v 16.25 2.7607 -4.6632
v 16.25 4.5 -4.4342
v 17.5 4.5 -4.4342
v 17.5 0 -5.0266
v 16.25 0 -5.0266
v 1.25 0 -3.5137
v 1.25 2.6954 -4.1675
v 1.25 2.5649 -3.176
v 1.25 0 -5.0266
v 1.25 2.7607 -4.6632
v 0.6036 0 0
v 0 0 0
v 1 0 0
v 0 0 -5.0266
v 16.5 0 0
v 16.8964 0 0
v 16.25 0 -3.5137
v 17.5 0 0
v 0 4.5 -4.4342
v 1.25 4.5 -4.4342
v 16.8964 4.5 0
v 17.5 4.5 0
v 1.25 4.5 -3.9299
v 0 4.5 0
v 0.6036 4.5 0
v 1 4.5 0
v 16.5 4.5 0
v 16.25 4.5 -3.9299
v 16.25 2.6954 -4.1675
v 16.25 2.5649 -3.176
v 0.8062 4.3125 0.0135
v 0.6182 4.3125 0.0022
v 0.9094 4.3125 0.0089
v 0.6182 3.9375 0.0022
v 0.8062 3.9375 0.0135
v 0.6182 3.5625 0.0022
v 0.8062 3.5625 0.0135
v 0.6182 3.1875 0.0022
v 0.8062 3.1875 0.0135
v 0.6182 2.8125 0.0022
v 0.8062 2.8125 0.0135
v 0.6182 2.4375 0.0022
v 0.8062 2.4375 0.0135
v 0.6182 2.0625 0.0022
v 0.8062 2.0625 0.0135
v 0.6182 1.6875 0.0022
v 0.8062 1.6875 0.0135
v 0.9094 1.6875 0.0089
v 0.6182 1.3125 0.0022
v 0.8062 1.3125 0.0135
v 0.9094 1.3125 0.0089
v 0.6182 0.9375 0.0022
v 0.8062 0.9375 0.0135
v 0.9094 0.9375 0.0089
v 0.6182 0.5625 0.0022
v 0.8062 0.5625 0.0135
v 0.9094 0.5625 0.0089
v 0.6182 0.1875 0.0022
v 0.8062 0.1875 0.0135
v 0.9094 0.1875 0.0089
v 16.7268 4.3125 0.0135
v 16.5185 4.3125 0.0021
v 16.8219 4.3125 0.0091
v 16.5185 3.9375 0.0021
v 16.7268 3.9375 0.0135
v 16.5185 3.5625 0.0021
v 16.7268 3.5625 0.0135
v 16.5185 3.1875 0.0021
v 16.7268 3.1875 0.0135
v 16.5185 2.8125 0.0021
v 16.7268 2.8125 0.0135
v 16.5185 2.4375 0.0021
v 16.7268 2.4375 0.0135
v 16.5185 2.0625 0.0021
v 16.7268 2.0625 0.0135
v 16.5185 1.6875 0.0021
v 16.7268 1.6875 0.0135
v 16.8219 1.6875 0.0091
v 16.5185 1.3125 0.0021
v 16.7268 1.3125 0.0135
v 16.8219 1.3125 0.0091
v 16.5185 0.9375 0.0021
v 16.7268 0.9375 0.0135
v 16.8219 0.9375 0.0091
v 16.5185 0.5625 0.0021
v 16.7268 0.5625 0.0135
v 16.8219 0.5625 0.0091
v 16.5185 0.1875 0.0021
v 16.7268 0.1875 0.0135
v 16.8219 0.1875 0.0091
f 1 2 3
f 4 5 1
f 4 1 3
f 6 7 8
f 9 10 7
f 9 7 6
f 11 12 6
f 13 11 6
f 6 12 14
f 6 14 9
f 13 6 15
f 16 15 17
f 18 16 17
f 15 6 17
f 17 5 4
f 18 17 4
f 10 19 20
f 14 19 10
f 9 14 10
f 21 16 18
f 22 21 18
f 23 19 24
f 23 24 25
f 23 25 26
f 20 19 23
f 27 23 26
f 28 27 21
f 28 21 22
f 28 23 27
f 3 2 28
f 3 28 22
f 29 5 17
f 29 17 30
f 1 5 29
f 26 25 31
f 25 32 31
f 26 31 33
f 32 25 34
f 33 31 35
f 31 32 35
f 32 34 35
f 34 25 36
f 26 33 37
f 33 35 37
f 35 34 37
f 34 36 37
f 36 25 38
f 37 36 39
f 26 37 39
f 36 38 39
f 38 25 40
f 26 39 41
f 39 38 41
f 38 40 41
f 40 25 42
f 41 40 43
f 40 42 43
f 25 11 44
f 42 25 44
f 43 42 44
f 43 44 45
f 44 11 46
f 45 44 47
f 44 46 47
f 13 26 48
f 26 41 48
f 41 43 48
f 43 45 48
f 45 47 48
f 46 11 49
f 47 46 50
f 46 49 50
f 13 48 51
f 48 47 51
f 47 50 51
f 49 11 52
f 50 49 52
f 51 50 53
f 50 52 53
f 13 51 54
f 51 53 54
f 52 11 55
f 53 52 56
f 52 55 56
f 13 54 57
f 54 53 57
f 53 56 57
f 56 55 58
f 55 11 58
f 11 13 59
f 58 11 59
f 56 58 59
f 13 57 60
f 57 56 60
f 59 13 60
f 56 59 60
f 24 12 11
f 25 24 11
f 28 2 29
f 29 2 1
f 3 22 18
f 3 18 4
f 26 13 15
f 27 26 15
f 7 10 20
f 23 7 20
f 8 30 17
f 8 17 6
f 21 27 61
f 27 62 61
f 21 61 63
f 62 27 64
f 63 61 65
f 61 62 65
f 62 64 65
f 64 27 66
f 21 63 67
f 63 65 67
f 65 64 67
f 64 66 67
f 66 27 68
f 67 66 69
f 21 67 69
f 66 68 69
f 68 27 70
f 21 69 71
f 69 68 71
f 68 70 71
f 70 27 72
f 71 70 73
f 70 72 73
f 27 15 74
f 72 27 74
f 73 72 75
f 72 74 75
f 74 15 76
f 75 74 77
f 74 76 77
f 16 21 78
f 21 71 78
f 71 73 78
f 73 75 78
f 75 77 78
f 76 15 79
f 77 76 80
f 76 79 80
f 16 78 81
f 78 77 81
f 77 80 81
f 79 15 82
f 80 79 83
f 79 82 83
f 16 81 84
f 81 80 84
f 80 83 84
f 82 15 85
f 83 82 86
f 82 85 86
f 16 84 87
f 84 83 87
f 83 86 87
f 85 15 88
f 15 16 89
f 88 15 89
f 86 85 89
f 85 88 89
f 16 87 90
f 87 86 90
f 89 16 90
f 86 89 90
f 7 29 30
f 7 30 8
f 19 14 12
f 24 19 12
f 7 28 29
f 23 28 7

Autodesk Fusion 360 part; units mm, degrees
sketch "Sketch1" plane through (0, 0, 0) normal (0, 1, 0) x (1, 0, 0)
  line L0 (0, 0) -> (30, 0)
  line L1 (30, 0) -> (30, -11.5)
  line L2 (30, -11.5) -> (0, -11.5)
  line L3 (0, -11.5) -> (0, 0)
  dimension "d1" = 30
  dimension "d2" = 11.5
extrude "Extrude1" add sketch "Sketch1" along normal blind 4.5

Autodesk Fusion 360 part; units mm, degrees
sketch "Sketch1" plane through (0, 0, 0) normal (0, 1, 0) x (1, 0, 0)
  line L0 (0, 0) -> (17.5, 0)
  line L1 (17.5, 0) -> (17.5, 3)
  line L2 (17.5, 3) -> (0, 3)
  line L3 (0, 3) -> (0, 0)
  line L4 (0, 0) -> (1, 0)
  line L5 (17.5, 0) -> (16.5, 0)
  line L6 (0, 3) -> (8.75, 3)
  line L7 (0, 0) -> (0, 1)
  line L8 (17.5, 0) -> (17.5, 1)
  line L9 (8.75, 3) -> (8.75, 2)
  spline S0 degree 5 poles (0, 1) (-0.0052, 0.8576) (0.0051, 0.5979) (0.0824, 0.284) (0.3098, 0.0171) (0.8015, -0.0688) (1.4966, 0.0725) (2.3822, 0.3921) (3.4374, 0.8195) (4.6351, 1.2741) (5.9435, 1.6748) (7.3276, 1.9503) (8.75, 2.049) (10.1724, 1.9503) (11.5565, 1.6748) (12.8649, 1.2741) (14.0626, 0.8195) (15.1178, 0.3921) (16.0034, 0.0725) (16.6985, -0.0688) (17.1902, 0.0171) (17.4176, 0.284) (17.4949, 0.5979) (17.5052, 0.8576) (17.5, 1) knots 0 0 0 0 0 0 0.05 0.1 0.15 0.2 0.25 0.3 0.35 0.4 0.45 0.5 0.55 0.6 0.65 0.7 0.75 0.8 0.85 0.9 0.95 1 1 1 1 1 1
  line L10 (17.5, 3) -> (0, 3)
  line L11 (0, 3) -> (0, 4.5)
  line L12 (0, 4.5) -> (17.5, 4.5)
  line L13 (17.5, 4.5) -> (17.5, 3)
  dimension "d1" = 17.5
  dimension "d2" = 3
  dimension "d3" = 1
  dimension "d4" = 1
  dimension "d5" = 8.75
  dimension "d6" = 1
  dimension "d7" = 1
  dimension "d8" = 1
  dimension "d23" = 17.5
  dimension "d24" = 1.5
extrude "Extrude1" add sketch "Sketch1" along normal blind 4 contours L0 L3 L4 L7 S0 | L0 L2 L3 L4 L6 L9 S0 L10 | L0 L1 L5 L8 S0 | L0 L1 L2 L5 L9 S0 L10 | L2 L6 L10 L11 L12 L13
draft "Draft1" angle 7.5 neutral plane through (0, 4, 0) pull (0, 1, 0) 1 faces at (5.8333, 2.6667, -4.5)
sketch "Sketch3" plane through (0, 0.6505, -4.941) normal (0, 0.1305, -0.9914) x (-1, 0, 0)
  line L0 (-17.5, -0.6561) -> (0, -0.6561)
  line L1 (0, -0.6561) -> (0, 3.3784)
  line L2 (0, 3.3784) -> (-17.5, 3.3784)
  line L3 (-17.5, 3.3784) -> (-17.5, -0.6561)
  line L4 (-17.5, 3.3784) -> (-16.25, 3.3784)
  line L5 (-16.25, 3.3784) -> (-16.25, 2.1284)
  line L6 (-16.25, 2.1284) -> (-17.5, 2.1284)
  line L7 (-17.5, 2.1284) -> (-17.5, 3.3784)
  line L8 (-16.25, 2.1284) -> (-1.25, 2.1284)
  line L9 (-1.25, 2.1284) -> (-1.25, -0.6561)
  line L10 (-1.25, -0.6561) -> (-16.25, -0.6561)
  line L11 (-16.25, -0.6561) -> (-16.25, 2.1284)
  line L12 (-1.25, 2.1284) -> (0, 2.1284)
  line L13 (-1.25, 2.1284) -> (-1.25, 3.3784)
  line L14 (-16.25, 3.3784) -> (-1.25, 3.3784)
  line L15 (-1.25, 3.3784) -> (-1.25, 4.3784)
  line L16 (-1.25, 4.3784) -> (-16.25, 4.3784)
  line L17 (-16.25, 4.3784) -> (-16.25, 3.3784)
  dimension "d25" = 1.25
  dimension "d26" = 1.25
  dimension "d34" = 1
extrude "Extrude3" cut sketch "Sketch3" against normal blind 1.5 contours L0 L8 L9 L10 L11
extrude "Extrude4" cut sketch "Sketch3" against normal blind 0.5 contours L2 L5 L8 L13 L14 | L2 L14 L15 L16 L17
fillet "Fillet1" [suppressed]
